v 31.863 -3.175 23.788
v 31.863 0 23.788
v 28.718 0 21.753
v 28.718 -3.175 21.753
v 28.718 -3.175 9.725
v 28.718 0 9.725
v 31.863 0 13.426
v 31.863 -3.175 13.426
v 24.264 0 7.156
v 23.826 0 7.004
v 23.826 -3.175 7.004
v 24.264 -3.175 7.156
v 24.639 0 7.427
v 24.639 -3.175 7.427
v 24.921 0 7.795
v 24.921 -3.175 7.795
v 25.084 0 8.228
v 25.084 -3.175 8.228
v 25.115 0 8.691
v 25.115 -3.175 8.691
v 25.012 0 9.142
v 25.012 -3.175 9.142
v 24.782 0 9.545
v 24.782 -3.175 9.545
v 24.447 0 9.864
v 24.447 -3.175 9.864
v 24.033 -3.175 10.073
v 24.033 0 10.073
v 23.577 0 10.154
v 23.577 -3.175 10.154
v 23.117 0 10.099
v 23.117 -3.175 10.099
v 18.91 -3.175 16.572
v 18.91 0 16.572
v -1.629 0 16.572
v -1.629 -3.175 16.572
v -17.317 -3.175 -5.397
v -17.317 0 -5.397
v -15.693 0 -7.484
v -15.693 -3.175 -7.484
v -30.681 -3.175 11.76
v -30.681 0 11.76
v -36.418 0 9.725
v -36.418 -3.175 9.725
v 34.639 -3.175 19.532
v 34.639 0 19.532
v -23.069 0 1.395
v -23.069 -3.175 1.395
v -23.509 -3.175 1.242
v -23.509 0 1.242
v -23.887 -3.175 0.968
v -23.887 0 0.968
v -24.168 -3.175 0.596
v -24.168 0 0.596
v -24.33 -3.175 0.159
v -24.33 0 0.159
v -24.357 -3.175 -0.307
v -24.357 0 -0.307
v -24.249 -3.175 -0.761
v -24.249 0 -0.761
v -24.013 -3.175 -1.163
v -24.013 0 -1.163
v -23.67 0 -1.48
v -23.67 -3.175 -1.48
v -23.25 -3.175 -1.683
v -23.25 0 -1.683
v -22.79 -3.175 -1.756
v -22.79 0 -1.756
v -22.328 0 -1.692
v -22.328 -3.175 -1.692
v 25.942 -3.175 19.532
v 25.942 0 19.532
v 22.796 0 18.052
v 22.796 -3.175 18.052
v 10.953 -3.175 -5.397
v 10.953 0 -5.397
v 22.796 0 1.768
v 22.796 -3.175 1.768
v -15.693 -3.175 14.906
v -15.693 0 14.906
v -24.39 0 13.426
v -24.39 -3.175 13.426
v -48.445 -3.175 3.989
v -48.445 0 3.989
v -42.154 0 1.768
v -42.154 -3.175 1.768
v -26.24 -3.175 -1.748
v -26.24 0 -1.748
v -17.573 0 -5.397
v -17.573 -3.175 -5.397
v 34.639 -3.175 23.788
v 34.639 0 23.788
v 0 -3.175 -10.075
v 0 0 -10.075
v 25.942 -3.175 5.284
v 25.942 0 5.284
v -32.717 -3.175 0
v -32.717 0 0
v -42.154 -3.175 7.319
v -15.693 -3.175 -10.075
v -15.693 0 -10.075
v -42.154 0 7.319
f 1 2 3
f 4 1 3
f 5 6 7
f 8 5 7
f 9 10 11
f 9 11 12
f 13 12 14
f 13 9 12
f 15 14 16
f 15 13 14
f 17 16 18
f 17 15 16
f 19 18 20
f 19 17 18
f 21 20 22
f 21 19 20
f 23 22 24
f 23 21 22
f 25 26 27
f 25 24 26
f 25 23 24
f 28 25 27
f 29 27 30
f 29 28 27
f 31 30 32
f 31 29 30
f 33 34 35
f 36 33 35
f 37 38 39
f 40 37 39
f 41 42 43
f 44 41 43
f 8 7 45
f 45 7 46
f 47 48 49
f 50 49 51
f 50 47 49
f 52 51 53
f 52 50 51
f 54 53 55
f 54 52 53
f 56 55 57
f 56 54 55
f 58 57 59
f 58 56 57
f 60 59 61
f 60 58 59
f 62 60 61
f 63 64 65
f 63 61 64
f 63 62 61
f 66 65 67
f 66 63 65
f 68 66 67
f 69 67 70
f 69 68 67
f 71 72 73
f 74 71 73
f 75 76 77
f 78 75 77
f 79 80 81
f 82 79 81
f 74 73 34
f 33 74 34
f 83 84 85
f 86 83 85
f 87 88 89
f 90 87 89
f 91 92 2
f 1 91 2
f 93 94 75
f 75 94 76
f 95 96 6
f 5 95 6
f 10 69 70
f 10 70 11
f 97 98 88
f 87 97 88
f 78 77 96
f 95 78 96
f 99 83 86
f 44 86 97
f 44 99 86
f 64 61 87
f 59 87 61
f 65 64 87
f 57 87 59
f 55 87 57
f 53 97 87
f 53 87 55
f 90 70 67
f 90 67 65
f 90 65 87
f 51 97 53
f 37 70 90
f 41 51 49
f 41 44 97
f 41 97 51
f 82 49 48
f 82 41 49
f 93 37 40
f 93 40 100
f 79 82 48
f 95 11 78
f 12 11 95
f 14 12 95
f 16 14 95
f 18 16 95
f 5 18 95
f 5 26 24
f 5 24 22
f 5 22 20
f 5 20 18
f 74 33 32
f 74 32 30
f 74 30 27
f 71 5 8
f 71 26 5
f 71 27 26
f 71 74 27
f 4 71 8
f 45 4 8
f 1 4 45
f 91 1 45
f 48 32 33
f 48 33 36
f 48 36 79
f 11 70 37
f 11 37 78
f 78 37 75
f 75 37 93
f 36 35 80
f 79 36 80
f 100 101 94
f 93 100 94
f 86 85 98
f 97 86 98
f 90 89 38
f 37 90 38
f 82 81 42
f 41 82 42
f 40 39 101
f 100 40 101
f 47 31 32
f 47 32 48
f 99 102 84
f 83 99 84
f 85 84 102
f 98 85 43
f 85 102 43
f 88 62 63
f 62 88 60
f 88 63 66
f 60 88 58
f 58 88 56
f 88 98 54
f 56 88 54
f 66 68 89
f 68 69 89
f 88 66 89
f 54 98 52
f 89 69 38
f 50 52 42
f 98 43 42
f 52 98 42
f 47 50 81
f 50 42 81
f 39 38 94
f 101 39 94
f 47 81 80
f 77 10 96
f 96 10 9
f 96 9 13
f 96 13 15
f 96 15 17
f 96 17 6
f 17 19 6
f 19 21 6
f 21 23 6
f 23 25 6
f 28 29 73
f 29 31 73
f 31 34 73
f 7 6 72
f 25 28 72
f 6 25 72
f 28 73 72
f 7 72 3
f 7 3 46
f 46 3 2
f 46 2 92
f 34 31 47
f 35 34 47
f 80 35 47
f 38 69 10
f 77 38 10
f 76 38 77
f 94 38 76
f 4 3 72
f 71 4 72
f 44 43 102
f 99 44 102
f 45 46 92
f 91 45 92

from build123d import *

# Parameters (mm, degrees)
F1_DEPTH = 3.175
F3_DEPTH = 9.144


with BuildPart() as f1:
    # F0 (on Front) → F1 (new body)
    with BuildSketch(Plane.XZ):
        Polygon((-42.153828, 7.319395), (-48.445281, 3.988625), (-42.153828, 1.768112), (-32.716647, 0), (-26.240151, -1.7477), (-17.573407, -5.396928), (-17.31674, -5.396928), (-15.692713, -7.484026), (-15.692713, -10.074626), (0, -10.074626), (10.953447, -5.396928), (22.796184, 1.768112), (25.94191, 5.283925), (28.717551, 9.724951), (31.86328, 13.425807), (34.638923, 19.532219), (34.638923, 21.752732), (34.638923, 23.788201), (31.86328, 23.788201), (28.717551, 21.752732), (25.94191, 19.532219), (22.796184, 18.051876), (18.910285, 16.571533), (10.953447, 16.571533), (-1.629462, 16.571533), (-15.692713, 14.906148), (-24.389723, 13.425807), (-30.681178, 11.760422), (-36.417503, 9.724951), align=None)
    extrude(amount=F1_DEPTH)

    # F2 (on Front) → F3 (cut)
    with BuildSketch(Plane.XZ):
        with BuildLine():
            Line((23.116694, 10.099179), (-23.068567, 1.39489))
            ThreePointArc((-23.068567, 1.39489), (-24.319738, -0.537971), (-22.327608, -1.69244))
            Line((-22.327608, -1.69244), (23.825702, 7.004356))
            ThreePointArc((23.825702, 7.004356), (25.080102, 8.920359), (23.116694, 10.099179))
        make_face()
    extrude(amount=F3_DEPTH, mode=Mode.SUBTRACT)


solid = f1.part
